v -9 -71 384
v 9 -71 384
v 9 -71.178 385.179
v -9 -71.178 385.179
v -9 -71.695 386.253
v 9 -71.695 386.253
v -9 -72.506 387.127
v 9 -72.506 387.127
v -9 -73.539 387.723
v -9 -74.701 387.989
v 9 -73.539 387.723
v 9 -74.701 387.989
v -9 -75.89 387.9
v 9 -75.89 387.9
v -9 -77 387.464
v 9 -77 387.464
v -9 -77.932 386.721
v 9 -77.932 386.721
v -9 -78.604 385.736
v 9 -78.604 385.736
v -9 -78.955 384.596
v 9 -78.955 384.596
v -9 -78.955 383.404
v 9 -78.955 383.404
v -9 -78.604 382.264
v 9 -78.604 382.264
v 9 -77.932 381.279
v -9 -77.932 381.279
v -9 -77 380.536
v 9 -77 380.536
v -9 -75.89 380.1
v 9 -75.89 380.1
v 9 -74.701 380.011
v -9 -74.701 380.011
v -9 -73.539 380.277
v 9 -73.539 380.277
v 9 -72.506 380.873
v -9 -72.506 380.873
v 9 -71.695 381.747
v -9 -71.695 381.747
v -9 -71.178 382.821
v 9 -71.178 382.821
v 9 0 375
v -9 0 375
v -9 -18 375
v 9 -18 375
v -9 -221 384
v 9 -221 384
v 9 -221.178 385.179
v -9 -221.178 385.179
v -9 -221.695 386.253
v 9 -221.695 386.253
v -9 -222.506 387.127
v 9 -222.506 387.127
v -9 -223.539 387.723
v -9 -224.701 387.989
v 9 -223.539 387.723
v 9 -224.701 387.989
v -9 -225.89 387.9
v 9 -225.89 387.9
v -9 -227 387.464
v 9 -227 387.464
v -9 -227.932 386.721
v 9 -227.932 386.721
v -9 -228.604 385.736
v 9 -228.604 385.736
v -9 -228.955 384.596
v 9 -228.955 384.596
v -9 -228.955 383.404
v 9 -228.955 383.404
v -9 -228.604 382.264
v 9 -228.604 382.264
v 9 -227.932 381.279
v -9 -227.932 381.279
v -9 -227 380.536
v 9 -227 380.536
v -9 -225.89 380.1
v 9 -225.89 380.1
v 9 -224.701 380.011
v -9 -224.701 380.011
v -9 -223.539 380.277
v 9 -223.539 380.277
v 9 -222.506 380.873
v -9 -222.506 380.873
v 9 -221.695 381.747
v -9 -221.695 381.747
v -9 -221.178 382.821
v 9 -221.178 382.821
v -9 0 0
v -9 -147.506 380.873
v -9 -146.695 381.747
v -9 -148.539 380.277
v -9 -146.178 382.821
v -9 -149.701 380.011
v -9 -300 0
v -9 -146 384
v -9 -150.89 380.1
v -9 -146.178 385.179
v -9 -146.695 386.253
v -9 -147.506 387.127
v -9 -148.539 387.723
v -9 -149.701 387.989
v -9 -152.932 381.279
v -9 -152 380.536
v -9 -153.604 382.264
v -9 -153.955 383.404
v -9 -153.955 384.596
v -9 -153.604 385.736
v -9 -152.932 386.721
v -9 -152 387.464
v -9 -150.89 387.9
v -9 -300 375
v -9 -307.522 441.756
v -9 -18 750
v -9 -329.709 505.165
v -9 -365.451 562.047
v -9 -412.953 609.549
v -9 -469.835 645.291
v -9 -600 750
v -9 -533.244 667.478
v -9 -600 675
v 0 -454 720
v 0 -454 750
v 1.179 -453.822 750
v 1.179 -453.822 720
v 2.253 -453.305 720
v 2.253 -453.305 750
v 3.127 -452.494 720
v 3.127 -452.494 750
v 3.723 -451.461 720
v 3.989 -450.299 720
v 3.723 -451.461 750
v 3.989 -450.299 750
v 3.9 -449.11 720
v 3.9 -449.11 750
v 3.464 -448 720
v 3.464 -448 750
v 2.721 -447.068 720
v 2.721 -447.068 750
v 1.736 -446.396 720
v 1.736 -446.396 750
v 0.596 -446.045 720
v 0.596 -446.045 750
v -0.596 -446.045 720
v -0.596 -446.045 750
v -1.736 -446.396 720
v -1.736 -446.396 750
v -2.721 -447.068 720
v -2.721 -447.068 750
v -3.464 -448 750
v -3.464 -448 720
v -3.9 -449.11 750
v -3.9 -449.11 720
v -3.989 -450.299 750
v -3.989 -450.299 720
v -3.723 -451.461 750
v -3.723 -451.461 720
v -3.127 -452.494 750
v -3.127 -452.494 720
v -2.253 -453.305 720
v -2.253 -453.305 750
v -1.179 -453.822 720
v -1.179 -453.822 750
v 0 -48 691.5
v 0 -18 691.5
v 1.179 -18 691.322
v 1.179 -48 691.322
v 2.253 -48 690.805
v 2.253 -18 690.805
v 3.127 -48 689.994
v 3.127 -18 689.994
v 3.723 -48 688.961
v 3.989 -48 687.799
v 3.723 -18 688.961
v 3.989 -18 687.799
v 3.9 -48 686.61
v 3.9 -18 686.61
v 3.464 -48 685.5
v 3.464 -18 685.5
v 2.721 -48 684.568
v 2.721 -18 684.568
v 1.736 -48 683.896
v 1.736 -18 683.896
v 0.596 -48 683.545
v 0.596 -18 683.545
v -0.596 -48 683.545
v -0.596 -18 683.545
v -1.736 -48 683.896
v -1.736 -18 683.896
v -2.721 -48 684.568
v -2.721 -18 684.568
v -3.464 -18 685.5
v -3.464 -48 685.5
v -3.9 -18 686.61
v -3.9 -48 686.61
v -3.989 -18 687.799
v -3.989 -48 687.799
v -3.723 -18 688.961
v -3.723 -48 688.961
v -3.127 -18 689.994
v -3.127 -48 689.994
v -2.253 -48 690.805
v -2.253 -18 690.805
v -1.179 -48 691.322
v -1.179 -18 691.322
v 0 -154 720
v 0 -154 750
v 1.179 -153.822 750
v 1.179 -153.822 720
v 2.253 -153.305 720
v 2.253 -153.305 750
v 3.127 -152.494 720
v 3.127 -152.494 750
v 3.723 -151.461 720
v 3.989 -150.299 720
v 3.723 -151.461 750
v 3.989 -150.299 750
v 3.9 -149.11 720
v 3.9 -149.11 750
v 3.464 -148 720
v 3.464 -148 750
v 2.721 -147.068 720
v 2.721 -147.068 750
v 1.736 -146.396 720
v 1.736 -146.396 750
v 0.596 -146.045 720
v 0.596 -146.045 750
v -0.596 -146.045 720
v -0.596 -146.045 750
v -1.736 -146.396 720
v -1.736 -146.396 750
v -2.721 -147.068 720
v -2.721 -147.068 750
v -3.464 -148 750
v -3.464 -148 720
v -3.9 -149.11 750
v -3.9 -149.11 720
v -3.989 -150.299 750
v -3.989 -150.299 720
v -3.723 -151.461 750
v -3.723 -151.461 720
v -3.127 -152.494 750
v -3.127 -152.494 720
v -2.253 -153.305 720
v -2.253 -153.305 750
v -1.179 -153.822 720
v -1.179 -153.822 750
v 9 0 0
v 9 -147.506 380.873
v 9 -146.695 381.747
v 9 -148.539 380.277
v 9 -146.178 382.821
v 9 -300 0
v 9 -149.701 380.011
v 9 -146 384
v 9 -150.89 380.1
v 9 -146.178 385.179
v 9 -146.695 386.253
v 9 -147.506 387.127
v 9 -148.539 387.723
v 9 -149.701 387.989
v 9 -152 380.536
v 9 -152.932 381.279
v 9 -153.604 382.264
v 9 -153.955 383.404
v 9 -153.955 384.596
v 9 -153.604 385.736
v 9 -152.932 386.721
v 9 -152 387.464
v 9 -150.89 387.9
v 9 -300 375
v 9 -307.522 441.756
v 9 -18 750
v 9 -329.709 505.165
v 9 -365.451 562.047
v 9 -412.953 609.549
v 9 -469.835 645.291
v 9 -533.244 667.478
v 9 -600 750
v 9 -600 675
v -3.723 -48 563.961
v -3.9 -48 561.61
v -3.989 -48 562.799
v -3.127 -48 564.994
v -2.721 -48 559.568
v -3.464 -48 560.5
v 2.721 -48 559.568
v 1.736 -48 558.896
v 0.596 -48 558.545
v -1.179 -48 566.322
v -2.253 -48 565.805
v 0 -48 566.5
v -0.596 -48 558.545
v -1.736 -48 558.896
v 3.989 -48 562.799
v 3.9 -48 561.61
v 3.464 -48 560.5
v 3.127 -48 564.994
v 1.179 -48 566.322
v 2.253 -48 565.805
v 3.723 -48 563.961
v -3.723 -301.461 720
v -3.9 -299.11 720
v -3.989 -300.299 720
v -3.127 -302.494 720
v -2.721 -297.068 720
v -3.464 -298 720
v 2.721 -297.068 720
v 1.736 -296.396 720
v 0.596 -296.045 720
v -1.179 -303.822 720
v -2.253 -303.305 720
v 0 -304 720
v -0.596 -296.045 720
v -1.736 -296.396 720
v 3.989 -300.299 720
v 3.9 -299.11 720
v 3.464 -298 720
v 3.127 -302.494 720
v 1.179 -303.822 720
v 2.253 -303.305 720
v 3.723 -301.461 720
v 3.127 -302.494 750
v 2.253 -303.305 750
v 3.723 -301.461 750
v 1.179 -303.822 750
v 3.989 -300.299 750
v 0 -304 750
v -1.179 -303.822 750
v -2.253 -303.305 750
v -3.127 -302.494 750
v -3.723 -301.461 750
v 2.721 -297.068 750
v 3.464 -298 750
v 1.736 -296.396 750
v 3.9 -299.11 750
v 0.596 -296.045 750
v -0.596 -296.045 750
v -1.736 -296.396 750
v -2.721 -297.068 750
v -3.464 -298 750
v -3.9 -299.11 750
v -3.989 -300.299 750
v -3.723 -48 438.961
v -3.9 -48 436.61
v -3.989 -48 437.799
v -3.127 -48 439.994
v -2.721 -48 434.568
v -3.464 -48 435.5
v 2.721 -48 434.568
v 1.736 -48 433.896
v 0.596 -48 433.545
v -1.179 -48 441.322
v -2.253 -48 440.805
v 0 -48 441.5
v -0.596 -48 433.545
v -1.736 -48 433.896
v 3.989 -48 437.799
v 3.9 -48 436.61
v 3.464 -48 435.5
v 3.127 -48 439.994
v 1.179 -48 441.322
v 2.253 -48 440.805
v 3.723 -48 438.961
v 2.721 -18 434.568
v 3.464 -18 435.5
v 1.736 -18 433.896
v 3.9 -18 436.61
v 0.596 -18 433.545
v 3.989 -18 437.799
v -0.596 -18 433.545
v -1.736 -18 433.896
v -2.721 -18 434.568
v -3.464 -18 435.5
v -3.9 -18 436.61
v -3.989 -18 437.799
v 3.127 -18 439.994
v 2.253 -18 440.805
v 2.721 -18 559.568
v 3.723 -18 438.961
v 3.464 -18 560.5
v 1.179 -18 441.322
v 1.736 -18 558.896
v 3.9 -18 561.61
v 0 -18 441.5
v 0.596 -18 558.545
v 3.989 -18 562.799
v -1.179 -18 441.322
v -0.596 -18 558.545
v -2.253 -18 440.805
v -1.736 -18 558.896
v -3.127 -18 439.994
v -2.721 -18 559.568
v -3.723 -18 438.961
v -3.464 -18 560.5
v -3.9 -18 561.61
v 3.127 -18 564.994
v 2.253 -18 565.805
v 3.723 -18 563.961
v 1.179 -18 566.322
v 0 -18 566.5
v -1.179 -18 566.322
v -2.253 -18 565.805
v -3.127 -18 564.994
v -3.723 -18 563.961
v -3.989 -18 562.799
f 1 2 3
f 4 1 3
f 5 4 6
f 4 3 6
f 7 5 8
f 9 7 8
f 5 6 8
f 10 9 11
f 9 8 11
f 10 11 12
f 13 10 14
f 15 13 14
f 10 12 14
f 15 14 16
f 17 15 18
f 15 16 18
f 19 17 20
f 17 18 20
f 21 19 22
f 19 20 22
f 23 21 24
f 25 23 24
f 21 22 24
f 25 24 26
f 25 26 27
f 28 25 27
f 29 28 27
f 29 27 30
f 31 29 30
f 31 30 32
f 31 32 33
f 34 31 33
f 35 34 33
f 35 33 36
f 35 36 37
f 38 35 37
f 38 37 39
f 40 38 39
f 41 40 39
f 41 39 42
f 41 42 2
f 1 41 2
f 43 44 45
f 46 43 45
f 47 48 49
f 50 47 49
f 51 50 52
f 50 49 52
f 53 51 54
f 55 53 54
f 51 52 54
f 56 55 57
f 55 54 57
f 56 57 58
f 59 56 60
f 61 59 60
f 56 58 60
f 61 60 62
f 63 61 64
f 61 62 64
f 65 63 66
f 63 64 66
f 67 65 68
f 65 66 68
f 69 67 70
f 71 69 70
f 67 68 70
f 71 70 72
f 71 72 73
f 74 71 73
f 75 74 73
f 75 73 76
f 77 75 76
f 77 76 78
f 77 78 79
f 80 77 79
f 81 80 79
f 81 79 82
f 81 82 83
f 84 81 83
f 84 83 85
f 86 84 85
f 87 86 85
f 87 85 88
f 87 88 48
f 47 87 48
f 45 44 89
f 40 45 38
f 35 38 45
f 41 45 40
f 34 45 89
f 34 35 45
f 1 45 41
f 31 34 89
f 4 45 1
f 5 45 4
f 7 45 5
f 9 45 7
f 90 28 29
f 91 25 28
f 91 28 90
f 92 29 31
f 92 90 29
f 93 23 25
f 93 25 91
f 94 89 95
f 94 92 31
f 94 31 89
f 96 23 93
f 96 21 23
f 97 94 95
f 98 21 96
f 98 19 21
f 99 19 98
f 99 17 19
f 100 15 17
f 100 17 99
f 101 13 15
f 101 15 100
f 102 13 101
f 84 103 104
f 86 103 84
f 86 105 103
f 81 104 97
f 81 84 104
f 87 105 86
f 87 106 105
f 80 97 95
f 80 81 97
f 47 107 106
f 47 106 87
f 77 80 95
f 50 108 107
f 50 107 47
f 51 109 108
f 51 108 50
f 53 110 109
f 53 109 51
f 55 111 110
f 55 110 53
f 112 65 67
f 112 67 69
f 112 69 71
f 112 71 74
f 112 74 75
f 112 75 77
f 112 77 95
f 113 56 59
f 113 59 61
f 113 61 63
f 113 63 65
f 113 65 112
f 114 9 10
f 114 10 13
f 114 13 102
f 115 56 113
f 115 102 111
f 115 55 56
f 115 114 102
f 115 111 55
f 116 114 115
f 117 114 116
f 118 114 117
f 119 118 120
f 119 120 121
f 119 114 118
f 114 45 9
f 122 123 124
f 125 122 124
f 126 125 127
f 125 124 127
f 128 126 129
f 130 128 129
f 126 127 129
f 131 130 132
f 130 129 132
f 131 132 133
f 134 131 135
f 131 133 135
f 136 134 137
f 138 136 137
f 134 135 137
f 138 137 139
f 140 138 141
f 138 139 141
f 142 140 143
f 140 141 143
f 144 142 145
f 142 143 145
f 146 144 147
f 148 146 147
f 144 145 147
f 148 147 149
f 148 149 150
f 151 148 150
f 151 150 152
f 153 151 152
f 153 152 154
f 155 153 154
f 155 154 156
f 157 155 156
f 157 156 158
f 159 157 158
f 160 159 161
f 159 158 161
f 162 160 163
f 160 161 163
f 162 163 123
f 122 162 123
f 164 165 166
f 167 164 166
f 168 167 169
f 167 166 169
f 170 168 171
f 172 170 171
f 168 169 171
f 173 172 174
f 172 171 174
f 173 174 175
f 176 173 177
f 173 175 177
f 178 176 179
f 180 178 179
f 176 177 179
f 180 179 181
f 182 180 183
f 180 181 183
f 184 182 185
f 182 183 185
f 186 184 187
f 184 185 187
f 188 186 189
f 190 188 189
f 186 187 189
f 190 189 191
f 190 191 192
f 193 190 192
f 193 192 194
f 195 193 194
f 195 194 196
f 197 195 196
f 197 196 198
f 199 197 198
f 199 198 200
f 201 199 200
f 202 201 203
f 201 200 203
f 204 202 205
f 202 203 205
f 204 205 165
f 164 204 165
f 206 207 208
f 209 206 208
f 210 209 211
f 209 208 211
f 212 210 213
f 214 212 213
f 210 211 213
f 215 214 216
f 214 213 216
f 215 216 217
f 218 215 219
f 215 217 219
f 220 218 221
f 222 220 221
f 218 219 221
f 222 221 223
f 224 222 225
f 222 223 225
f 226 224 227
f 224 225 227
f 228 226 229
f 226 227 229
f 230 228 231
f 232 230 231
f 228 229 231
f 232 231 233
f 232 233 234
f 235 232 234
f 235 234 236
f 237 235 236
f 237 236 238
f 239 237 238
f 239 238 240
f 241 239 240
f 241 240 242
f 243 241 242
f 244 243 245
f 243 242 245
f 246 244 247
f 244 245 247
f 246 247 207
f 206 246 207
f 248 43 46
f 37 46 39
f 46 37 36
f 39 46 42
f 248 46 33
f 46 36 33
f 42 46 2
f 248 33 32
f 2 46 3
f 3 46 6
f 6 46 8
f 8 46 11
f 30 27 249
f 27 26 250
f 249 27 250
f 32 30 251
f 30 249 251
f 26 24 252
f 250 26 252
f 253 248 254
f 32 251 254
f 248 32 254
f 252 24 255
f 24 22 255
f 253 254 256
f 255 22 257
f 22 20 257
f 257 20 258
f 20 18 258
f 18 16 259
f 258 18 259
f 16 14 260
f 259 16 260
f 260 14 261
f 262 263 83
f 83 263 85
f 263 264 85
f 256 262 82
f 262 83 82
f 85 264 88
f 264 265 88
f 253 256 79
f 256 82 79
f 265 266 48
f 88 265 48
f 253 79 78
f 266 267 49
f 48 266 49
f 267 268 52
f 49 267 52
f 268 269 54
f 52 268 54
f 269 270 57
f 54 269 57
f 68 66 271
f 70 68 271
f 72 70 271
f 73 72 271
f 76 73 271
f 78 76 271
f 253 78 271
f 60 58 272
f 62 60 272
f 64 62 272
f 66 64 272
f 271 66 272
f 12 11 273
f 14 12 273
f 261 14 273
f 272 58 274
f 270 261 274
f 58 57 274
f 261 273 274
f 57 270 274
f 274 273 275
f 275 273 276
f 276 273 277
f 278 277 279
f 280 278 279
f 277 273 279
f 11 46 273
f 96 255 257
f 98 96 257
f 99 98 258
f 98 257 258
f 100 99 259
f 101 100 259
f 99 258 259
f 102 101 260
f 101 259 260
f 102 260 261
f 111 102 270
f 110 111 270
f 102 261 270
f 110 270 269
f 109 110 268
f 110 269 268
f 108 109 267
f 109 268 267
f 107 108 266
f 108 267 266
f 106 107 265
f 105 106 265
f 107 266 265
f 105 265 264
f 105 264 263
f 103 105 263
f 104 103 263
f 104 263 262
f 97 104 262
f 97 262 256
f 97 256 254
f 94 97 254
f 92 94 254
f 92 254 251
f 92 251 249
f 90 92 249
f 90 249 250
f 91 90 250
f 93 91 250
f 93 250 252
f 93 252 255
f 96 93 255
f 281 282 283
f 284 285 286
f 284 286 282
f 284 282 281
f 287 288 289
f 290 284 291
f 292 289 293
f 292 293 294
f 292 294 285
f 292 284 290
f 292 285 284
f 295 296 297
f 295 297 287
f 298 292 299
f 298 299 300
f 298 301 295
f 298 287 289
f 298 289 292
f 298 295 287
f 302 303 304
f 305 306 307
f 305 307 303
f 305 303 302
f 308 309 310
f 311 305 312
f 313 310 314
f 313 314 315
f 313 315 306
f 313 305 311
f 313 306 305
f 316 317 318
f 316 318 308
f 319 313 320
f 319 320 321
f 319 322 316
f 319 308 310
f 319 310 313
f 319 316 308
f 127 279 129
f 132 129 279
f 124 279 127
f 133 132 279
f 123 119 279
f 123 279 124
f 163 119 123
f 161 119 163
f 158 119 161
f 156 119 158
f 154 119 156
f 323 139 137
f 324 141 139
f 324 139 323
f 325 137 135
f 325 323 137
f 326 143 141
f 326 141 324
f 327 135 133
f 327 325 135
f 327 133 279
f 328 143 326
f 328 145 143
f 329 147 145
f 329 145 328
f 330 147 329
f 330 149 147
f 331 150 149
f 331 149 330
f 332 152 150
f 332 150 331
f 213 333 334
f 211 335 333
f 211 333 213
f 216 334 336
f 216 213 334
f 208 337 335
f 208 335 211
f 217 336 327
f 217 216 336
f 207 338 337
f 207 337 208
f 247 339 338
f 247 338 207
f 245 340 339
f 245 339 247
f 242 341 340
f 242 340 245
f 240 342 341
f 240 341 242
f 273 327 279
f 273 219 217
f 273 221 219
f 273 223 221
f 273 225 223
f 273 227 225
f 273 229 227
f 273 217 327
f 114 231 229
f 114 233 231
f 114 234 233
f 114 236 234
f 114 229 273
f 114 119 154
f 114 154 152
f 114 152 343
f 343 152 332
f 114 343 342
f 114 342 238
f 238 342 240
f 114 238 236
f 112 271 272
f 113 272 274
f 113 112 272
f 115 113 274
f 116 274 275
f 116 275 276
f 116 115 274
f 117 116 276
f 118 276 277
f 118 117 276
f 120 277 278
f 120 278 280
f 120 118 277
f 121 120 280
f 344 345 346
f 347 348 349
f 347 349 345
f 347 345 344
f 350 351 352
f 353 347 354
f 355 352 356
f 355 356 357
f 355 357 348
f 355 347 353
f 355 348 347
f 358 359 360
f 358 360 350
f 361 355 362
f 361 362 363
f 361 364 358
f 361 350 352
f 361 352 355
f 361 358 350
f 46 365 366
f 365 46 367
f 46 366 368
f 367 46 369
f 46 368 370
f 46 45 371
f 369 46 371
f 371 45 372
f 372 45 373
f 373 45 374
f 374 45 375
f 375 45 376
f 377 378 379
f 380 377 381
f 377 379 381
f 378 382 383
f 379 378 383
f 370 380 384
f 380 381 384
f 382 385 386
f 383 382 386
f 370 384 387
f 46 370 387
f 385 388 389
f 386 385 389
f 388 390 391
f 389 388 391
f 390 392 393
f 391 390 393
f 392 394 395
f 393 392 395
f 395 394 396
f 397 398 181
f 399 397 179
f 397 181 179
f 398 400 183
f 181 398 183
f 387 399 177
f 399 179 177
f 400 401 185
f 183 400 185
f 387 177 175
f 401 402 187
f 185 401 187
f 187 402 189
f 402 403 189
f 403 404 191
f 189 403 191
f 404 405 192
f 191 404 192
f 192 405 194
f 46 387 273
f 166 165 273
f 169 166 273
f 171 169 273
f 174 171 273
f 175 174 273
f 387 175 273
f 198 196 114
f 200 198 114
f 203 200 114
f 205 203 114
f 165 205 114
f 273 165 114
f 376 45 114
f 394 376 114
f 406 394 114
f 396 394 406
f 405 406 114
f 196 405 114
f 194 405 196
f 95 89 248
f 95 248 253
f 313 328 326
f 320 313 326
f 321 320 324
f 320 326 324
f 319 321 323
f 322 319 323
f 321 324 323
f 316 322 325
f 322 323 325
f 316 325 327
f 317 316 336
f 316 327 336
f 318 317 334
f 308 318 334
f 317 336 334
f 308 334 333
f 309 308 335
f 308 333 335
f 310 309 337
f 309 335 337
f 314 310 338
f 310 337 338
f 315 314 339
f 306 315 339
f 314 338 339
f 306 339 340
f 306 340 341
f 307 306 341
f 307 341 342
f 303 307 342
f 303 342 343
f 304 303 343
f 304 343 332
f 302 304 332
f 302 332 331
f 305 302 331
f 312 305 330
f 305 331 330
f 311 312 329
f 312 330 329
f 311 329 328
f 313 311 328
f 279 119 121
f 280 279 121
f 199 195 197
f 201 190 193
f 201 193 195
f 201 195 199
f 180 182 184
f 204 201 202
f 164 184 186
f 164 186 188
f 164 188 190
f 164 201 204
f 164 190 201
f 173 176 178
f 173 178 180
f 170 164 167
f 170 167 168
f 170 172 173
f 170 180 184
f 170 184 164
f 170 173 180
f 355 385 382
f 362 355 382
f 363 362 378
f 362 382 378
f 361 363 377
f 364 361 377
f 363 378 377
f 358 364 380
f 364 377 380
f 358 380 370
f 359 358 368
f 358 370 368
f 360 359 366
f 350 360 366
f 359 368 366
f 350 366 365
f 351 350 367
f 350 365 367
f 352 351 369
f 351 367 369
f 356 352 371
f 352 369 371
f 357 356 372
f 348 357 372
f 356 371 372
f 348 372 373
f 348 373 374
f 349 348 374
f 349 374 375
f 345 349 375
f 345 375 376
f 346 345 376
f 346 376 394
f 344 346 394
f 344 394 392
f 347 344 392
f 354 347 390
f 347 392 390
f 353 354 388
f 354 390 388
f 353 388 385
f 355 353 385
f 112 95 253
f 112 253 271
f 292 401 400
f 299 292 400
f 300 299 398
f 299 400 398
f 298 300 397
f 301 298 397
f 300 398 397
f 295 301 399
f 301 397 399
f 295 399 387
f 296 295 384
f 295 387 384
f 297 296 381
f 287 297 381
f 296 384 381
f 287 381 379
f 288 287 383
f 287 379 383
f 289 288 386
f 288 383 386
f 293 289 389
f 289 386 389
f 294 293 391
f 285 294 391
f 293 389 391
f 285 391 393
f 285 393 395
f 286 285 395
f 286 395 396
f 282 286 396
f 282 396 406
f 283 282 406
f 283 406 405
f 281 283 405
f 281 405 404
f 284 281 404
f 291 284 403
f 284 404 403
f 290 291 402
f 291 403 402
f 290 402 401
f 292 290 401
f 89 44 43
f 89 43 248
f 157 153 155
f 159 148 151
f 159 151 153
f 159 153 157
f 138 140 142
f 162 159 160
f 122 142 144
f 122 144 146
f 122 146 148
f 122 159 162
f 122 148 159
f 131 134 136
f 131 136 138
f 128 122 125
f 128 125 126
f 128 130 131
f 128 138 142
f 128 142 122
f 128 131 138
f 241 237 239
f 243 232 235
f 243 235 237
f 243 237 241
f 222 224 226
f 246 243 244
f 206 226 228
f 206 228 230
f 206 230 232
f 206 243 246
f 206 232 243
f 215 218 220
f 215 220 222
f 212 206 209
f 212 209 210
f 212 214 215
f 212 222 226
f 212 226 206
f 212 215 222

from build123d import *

# Parameters (mm, degrees)
PAD024_DEPTH    = 18
SKETCH070_R     = 4
POCKET021_DEPTH = 30
SKETCH071_R     = 4
POCKET022_DEPTH = 30
SKETCH074_R     = 4
POCKET025_DEPTH = 18.001


with BuildPart() as part:
    # Sketch066 → Pad024 (new body)
    with BuildSketch(Plane.YZ):
        with BuildLine():
            Line((-600, 750), (-18, 750))
            Line((-18, 375), (-18, 750))
            Line((0, 375), (-18, 375))
            Line((0, 375), (0, 0))
            Line((0, 0), (-300, 0))
            Line((-300, 0), (-300, 375))
            ThreePointArc((-300, 375), (-387.867966, 587.132034), (-600, 675))
            Line((-600, 750), (-600, 675))
        make_face()
    extrude(amount=PAD024_DEPTH)

    # Sketch070 (on Face6 of Pad024) → Pocket021 (cut)
    with BuildSketch(Plane(origin=(0, 0, 750), x_dir=(0, -1, 0), z_dir=(0, 0, 1))):
        with Locations((300, 9)):
            Circle(SKETCH070_R)
        with Locations((450, 9)):
            Circle(SKETCH070_R)
        with Locations((150, 9)):
            Circle(SKETCH070_R)
    extrude(amount=-POCKET021_DEPTH, mode=Mode.SUBTRACT)

    # Sketch071 (on Face6 of Pocket021) → Pocket022 (cut)
    with BuildSketch(Plane.ZX.offset(-18)):
        with Locations((437.5, 9)):
            Circle(SKETCH071_R)
        with Locations((562.5, 9)):
            Circle(SKETCH071_R)
        with Locations((687.5, 9)):
            Circle(SKETCH071_R)
    extrude(amount=-POCKET022_DEPTH, mode=Mode.SUBTRACT)

    # Sketch074 (on Face5 of Pocket022) → Pocket025 (cut, through all)
    with BuildSketch(Plane.YZ.offset(18)):
        with Locations((-225, 384)):
            Circle(SKETCH074_R)
        with Locations((-150, 384)):
            Circle(SKETCH074_R)
        with Locations((-75, 384)):
            Circle(SKETCH074_R)
    extrude(amount=-POCKET025_DEPTH, mode=Mode.SUBTRACT)


with BuildPart() as part_1:
    # Body018001001001010001003001003001001021 placement: moved
    add(part.part.moved(Location((-9, 0, 0))))


solid = part_1.part
